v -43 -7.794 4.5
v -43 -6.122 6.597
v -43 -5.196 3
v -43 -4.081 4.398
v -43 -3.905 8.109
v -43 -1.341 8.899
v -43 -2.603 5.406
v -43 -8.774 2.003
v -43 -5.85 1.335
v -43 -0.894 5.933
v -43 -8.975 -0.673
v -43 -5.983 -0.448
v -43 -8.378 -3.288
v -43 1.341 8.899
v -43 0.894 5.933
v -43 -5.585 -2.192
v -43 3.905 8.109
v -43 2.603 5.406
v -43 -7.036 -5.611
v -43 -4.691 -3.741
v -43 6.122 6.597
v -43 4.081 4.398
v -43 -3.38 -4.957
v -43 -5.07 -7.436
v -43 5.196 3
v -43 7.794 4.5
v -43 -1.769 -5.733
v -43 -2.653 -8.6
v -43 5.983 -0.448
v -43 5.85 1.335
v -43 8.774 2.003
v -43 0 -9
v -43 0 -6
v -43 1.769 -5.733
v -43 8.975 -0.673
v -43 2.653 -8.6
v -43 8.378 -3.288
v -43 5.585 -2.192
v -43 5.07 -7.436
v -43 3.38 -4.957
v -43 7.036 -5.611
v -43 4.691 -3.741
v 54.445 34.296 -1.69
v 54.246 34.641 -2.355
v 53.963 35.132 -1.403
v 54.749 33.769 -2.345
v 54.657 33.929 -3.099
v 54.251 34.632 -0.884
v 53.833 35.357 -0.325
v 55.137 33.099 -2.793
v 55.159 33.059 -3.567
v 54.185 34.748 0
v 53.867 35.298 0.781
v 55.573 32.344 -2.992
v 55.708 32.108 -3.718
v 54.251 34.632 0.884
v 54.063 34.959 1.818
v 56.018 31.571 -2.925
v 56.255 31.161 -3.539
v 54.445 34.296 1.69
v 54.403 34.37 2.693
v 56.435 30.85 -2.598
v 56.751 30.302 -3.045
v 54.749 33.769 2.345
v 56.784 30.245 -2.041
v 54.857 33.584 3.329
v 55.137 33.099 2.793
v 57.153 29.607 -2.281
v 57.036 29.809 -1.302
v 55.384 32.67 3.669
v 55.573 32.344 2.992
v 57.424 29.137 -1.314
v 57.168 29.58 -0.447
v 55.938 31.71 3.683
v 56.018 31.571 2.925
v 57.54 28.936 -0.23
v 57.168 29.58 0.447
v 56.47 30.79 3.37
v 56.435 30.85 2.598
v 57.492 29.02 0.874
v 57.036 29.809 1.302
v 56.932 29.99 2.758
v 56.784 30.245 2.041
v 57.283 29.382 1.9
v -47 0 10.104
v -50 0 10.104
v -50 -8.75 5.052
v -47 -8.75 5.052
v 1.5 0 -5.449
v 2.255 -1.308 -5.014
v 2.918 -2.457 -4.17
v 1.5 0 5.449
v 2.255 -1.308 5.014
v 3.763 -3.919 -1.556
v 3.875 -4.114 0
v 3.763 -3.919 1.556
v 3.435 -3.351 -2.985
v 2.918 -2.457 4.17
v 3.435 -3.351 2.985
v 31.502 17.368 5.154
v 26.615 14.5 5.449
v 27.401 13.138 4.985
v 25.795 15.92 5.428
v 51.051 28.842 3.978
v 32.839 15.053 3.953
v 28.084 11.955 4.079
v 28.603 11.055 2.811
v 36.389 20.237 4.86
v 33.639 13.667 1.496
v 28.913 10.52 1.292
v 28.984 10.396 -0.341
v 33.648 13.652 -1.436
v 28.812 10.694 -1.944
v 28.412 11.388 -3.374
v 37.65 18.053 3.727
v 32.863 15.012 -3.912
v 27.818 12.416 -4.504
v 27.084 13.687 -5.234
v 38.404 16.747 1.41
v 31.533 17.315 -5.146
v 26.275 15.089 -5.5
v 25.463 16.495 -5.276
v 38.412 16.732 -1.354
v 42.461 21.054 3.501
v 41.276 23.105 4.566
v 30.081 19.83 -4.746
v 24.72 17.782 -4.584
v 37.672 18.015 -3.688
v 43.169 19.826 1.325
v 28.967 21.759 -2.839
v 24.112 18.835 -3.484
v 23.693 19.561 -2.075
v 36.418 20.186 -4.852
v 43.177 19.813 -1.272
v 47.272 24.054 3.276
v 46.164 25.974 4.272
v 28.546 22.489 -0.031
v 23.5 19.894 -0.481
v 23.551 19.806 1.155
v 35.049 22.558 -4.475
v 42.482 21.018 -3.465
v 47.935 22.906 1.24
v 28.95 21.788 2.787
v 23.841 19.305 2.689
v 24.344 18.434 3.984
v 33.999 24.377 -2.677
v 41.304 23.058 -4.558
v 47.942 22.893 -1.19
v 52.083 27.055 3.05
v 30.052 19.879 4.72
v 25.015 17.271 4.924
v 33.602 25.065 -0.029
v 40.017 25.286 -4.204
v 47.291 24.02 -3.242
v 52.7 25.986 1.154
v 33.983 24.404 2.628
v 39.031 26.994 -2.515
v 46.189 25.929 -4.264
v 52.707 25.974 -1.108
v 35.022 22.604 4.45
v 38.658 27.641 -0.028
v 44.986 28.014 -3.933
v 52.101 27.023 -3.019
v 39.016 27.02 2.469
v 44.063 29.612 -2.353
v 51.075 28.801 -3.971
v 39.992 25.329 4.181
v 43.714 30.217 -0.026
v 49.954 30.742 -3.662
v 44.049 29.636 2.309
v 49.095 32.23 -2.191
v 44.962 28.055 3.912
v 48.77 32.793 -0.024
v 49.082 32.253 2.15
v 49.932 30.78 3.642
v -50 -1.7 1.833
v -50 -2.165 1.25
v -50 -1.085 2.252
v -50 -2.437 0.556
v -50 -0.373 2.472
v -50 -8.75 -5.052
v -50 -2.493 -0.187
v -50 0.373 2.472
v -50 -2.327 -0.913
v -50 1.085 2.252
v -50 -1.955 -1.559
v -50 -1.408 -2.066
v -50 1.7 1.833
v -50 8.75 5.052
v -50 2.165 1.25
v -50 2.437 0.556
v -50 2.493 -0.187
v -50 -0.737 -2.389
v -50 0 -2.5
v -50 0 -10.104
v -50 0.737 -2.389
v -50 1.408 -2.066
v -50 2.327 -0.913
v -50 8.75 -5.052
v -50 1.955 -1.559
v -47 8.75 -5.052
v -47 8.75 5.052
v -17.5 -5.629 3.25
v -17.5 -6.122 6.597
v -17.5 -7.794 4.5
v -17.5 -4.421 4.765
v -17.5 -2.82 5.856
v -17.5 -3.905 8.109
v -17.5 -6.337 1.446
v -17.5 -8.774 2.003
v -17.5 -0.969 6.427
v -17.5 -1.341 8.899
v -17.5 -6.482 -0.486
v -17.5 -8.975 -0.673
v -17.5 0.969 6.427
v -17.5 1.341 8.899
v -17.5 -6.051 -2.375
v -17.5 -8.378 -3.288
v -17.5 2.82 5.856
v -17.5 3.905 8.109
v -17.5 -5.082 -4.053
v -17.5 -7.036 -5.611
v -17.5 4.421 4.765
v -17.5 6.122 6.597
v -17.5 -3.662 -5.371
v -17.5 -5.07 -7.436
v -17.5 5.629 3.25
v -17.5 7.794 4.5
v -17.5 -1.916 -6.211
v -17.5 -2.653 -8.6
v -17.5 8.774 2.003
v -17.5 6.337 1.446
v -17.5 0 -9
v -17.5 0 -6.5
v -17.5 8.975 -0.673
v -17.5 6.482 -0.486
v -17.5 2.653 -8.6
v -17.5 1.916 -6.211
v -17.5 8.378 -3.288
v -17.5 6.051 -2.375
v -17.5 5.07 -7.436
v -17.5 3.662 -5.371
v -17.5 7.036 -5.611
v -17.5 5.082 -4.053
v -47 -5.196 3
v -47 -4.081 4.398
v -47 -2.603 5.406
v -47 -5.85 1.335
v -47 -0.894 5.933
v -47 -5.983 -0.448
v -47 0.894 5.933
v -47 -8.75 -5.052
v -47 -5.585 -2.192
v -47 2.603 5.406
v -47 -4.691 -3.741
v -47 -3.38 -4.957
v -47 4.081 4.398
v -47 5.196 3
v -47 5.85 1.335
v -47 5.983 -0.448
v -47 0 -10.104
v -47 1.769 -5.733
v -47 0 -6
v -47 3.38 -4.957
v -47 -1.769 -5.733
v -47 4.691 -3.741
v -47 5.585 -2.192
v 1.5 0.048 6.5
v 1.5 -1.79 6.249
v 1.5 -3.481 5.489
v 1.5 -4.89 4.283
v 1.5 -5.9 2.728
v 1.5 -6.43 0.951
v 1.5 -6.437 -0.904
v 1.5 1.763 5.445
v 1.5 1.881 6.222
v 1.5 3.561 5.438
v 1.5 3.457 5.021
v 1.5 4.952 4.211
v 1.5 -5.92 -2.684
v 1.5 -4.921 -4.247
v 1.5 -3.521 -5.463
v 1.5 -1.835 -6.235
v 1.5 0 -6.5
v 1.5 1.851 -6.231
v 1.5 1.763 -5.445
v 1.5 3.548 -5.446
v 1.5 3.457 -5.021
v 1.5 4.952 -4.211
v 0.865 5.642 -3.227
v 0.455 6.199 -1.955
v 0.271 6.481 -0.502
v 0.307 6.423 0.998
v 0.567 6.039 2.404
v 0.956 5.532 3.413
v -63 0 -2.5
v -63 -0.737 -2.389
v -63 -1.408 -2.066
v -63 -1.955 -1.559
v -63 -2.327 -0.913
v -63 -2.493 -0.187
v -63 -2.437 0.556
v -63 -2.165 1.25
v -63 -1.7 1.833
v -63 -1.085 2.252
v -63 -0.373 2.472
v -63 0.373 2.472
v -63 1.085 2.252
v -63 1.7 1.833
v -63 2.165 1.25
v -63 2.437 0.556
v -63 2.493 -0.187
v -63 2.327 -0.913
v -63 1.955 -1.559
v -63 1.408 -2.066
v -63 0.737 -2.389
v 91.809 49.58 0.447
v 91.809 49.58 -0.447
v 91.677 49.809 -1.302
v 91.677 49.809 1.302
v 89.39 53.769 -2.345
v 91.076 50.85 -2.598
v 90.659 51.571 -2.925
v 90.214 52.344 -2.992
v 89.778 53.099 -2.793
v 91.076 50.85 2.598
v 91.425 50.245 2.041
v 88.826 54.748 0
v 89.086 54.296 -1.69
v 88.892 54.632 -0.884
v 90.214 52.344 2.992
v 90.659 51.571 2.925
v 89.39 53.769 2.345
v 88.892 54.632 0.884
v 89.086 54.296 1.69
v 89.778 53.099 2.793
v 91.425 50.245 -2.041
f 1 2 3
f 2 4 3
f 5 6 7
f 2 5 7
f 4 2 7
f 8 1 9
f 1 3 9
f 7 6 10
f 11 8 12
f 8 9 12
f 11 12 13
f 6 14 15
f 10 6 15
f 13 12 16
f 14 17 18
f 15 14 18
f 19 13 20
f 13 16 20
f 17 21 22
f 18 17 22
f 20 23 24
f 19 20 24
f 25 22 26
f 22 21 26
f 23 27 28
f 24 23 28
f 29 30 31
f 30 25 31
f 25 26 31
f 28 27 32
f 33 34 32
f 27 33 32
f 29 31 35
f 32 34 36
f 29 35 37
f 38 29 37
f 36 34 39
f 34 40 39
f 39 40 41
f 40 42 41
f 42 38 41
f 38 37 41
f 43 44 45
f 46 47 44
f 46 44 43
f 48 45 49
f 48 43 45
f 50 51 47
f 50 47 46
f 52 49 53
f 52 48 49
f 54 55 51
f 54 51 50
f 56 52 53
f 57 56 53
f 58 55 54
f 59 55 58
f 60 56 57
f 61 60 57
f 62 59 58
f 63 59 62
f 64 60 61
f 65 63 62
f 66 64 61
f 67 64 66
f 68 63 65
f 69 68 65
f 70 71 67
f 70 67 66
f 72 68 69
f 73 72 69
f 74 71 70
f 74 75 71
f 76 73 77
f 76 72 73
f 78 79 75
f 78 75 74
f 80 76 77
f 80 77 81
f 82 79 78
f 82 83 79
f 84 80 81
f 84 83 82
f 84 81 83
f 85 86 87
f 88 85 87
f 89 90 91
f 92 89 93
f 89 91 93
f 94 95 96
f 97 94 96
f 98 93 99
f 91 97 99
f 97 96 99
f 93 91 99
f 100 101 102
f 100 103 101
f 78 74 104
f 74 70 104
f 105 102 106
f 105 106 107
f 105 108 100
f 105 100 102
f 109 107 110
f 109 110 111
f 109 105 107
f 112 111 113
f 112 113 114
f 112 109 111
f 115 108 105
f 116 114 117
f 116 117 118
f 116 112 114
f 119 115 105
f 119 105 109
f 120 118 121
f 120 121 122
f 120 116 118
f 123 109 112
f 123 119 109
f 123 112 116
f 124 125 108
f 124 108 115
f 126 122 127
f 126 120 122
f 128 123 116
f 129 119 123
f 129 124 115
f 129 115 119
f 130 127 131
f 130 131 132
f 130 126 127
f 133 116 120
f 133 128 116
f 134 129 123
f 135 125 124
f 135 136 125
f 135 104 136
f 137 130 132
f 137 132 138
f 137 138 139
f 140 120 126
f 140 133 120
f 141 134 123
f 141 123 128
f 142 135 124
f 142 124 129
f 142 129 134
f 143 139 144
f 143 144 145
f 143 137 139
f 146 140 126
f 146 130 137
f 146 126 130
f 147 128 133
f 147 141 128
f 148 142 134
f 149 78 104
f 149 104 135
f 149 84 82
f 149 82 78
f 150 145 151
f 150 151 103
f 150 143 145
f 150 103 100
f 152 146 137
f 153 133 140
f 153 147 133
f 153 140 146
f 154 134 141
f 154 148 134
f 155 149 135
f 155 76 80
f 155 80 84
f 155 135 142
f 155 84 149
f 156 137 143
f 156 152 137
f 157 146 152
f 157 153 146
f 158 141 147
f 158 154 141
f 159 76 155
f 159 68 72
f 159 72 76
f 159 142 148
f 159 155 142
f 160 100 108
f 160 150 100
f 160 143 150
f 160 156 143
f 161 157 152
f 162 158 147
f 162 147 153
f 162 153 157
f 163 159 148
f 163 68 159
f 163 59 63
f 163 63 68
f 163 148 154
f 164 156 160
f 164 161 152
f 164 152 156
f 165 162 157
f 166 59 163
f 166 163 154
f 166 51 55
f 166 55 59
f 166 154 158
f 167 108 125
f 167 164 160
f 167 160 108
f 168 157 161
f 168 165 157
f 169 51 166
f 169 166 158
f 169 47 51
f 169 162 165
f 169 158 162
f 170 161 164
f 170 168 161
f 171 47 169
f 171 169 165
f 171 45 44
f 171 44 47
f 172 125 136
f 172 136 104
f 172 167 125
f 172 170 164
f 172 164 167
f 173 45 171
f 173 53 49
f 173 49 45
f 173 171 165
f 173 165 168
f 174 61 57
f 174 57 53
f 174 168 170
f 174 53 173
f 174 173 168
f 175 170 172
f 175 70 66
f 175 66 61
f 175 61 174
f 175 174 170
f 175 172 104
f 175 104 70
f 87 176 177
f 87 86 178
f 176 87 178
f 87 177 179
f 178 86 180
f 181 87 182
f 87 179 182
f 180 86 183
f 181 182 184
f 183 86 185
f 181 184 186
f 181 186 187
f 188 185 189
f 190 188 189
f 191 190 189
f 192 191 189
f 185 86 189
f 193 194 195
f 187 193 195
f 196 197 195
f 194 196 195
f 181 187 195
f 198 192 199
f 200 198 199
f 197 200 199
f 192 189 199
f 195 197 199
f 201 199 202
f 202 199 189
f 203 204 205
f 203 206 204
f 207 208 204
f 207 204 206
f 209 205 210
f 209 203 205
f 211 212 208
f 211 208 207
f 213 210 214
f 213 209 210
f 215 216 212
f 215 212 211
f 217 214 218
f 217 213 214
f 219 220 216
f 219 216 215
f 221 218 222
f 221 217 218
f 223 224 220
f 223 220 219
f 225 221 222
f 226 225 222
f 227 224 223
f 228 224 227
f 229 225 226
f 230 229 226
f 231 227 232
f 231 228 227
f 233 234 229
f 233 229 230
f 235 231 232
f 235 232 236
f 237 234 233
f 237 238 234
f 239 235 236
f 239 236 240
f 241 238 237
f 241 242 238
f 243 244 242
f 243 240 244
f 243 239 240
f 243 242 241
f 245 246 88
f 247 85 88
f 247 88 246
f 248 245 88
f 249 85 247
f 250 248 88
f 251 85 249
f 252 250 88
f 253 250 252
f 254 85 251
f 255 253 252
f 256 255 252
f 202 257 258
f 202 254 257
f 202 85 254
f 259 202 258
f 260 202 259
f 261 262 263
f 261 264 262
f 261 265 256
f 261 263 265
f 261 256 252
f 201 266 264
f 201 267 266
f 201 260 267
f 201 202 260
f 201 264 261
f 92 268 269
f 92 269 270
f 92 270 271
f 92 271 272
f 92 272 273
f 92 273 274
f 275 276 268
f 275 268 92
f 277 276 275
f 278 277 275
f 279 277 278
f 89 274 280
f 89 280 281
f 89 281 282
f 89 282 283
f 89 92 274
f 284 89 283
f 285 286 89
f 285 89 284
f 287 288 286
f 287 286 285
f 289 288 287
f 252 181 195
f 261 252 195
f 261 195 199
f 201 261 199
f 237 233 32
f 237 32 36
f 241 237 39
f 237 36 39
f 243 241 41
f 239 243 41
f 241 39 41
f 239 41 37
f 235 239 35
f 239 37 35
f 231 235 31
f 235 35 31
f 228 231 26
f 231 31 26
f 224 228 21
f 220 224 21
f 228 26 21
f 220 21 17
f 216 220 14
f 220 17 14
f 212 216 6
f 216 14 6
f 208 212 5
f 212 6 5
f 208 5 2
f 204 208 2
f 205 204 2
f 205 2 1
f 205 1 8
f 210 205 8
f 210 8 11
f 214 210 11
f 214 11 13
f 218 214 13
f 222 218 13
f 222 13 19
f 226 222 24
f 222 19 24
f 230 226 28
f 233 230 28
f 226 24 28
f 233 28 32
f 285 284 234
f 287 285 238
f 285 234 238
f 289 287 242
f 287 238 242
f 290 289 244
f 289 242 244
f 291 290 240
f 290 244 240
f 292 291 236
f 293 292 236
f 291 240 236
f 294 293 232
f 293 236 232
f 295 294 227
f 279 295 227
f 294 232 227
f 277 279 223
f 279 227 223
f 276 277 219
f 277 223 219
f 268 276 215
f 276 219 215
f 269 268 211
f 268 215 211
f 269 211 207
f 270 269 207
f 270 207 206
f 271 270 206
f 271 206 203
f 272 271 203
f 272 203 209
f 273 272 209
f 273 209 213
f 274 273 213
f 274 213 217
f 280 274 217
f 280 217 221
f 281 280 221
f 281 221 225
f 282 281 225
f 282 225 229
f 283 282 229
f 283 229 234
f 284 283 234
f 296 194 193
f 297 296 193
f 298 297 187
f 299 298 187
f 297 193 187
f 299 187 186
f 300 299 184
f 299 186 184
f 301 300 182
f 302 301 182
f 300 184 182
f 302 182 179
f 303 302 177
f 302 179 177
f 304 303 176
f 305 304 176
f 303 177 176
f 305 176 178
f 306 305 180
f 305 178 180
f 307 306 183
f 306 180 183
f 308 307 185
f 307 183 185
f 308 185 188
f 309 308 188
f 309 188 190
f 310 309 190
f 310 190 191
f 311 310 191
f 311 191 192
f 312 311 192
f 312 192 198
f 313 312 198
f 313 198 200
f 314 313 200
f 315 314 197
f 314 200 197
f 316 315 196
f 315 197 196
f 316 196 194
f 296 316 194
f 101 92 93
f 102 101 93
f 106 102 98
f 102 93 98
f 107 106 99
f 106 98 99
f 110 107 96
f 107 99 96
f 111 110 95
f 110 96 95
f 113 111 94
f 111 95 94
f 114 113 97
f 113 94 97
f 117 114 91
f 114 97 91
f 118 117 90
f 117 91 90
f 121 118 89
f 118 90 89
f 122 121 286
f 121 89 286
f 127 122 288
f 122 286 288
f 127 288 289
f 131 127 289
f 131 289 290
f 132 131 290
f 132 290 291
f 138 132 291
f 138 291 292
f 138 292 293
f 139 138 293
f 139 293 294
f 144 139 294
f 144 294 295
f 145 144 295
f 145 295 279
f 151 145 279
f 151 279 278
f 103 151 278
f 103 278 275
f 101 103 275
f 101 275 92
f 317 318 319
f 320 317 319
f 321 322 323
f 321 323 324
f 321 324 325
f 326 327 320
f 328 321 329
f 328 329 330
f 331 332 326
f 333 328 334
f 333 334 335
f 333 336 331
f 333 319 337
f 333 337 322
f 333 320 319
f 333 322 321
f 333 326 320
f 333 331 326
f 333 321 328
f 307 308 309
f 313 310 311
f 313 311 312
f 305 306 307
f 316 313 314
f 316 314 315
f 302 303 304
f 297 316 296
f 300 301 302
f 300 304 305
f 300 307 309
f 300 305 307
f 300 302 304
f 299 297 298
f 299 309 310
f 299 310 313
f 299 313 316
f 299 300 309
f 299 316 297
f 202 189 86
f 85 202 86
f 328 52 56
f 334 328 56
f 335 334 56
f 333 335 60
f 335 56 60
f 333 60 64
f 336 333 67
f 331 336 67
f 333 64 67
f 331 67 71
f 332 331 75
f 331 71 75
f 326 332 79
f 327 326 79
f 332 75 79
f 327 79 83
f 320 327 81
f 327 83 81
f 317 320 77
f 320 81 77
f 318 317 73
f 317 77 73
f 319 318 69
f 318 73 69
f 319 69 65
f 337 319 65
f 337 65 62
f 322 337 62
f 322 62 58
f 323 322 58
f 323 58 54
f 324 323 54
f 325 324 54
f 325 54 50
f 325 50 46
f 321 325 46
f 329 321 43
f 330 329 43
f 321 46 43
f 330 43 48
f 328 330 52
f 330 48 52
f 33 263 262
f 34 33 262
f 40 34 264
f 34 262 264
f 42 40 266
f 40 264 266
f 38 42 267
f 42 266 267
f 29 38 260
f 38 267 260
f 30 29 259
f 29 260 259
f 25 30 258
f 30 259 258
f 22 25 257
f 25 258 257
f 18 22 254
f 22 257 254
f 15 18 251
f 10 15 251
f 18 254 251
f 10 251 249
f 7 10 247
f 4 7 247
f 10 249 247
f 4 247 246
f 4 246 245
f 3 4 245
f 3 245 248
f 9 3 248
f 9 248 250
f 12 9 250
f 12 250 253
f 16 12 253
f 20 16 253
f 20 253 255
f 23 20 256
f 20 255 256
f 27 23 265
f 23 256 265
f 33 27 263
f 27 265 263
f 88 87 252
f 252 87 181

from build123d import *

# Parameters (mm, degrees)
BOSS_EXTRUDE1_DEPTH = 3
SKETCH3_R           = 6
BOSS_EXTRUDE2_DEPTH = 4
SKETCH4_R           = 9
BOSS_EXTRUDE3_DEPTH = 25.5
SKETCH5_R           = 6.5
BOSS_EXTRUDE4_DEPTH = 19
SKETCH6_R           = 2.5
BOSS_EXTRUDE5_DEPTH = 13
SKETCH8_R           = 5.5
BOSS_EXTRUDE6_DEPTH = 29
SKETCH9_R           = 5.5
BOSS_EXTRUDE7_DEPTH = 34
BOSS_EXTRUDE7_TAPER = 3
SKETCH10_R          = 3
BOSS_EXTRUDE8_DEPTH = 40


with BuildPart() as part:
    # Sketch2 → Boss-Extrude1 (new body)
    with BuildSketch(Plane(origin=(-50, 0, 0), x_dir=(0, 0, -1), z_dir=(1, 0, 0))):
        Polygon((-5.051814855, 8.75), (-10.103629711, 0), (-5.051814855, -8.75), (5.051814855, -8.75), (10.103629711, 0), (5.051814855, 8.75), align=None)
    extrude(amount=BOSS_EXTRUDE1_DEPTH)

    # Sketch3 → Boss-Extrude2 (add)
    with BuildSketch(Plane(origin=(-47, 0, 0), x_dir=(0, 0, -1), z_dir=(1, 0, 0))):
        Circle(SKETCH3_R)
    extrude(amount=BOSS_EXTRUDE2_DEPTH)

    # Sketch4 → Boss-Extrude3 (add)
    with BuildSketch(Plane(origin=(-43, 0, 0), x_dir=(0, 0, -1), z_dir=(1, 0, 0))):
        Circle(SKETCH4_R)
    extrude(amount=BOSS_EXTRUDE3_DEPTH)

    # Sketch5 → Boss-Extrude4 (add)
    with BuildSketch(Plane(origin=(-17.5, 0, 0), x_dir=(0, 0, -1), z_dir=(1, 0, 0))):
        Circle(SKETCH5_R)
    extrude(amount=BOSS_EXTRUDE4_DEPTH)

    # Sketch6 → Boss-Extrude5 (add)
    with BuildSketch(Plane.ZY.offset(50)):
        with Locations(Location((0, 0, 0), (0, 0, 180))):
            Circle(SKETCH6_R)
    extrude(amount=BOSS_EXTRUDE5_DEPTH)

    # Sketch8 → Boss-Extrude6 (add)
    with BuildSketch(Plane(origin=(1.125, 0.649519053, 0), x_dir=(0, 0, -1), z_dir=(0.8660254037844379, 0.5000000000000012, 0))):
        with Locations(Location((0, 0, 0), (0, 0, 187.837479763))):
            Circle(SKETCH8_R)
    extrude(amount=BOSS_EXTRUDE6_DEPTH)

    # Sketch9 → Boss-Extrude7 (add)
    with BuildSketch(Plane(origin=(26.23973671, 15.149519053, 0), x_dir=(0, 0, -1), z_dir=(0.8660254037844379, 0.5000000000000012, 0))):
        with Locations(Location((0, 0, 0), (0, 0, 187.837479763))):
            Circle(SKETCH9_R)
    extrude(amount=BOSS_EXTRUDE7_DEPTH, taper=BOSS_EXTRUDE7_TAPER)

    # Sketch10 → Boss-Extrude8 (add)
    with BuildSketch(Plane(origin=(55.684600438, 32.149519053, 0), x_dir=(0, 0, -1), z_dir=(0.8660254037844379, 0.5000000000000012, 0))):
        with Locations(Location((0, 0, 0), (0, 0, 90))):
            Circle(SKETCH10_R)
    extrude(amount=BOSS_EXTRUDE8_DEPTH)


solid = part.part
